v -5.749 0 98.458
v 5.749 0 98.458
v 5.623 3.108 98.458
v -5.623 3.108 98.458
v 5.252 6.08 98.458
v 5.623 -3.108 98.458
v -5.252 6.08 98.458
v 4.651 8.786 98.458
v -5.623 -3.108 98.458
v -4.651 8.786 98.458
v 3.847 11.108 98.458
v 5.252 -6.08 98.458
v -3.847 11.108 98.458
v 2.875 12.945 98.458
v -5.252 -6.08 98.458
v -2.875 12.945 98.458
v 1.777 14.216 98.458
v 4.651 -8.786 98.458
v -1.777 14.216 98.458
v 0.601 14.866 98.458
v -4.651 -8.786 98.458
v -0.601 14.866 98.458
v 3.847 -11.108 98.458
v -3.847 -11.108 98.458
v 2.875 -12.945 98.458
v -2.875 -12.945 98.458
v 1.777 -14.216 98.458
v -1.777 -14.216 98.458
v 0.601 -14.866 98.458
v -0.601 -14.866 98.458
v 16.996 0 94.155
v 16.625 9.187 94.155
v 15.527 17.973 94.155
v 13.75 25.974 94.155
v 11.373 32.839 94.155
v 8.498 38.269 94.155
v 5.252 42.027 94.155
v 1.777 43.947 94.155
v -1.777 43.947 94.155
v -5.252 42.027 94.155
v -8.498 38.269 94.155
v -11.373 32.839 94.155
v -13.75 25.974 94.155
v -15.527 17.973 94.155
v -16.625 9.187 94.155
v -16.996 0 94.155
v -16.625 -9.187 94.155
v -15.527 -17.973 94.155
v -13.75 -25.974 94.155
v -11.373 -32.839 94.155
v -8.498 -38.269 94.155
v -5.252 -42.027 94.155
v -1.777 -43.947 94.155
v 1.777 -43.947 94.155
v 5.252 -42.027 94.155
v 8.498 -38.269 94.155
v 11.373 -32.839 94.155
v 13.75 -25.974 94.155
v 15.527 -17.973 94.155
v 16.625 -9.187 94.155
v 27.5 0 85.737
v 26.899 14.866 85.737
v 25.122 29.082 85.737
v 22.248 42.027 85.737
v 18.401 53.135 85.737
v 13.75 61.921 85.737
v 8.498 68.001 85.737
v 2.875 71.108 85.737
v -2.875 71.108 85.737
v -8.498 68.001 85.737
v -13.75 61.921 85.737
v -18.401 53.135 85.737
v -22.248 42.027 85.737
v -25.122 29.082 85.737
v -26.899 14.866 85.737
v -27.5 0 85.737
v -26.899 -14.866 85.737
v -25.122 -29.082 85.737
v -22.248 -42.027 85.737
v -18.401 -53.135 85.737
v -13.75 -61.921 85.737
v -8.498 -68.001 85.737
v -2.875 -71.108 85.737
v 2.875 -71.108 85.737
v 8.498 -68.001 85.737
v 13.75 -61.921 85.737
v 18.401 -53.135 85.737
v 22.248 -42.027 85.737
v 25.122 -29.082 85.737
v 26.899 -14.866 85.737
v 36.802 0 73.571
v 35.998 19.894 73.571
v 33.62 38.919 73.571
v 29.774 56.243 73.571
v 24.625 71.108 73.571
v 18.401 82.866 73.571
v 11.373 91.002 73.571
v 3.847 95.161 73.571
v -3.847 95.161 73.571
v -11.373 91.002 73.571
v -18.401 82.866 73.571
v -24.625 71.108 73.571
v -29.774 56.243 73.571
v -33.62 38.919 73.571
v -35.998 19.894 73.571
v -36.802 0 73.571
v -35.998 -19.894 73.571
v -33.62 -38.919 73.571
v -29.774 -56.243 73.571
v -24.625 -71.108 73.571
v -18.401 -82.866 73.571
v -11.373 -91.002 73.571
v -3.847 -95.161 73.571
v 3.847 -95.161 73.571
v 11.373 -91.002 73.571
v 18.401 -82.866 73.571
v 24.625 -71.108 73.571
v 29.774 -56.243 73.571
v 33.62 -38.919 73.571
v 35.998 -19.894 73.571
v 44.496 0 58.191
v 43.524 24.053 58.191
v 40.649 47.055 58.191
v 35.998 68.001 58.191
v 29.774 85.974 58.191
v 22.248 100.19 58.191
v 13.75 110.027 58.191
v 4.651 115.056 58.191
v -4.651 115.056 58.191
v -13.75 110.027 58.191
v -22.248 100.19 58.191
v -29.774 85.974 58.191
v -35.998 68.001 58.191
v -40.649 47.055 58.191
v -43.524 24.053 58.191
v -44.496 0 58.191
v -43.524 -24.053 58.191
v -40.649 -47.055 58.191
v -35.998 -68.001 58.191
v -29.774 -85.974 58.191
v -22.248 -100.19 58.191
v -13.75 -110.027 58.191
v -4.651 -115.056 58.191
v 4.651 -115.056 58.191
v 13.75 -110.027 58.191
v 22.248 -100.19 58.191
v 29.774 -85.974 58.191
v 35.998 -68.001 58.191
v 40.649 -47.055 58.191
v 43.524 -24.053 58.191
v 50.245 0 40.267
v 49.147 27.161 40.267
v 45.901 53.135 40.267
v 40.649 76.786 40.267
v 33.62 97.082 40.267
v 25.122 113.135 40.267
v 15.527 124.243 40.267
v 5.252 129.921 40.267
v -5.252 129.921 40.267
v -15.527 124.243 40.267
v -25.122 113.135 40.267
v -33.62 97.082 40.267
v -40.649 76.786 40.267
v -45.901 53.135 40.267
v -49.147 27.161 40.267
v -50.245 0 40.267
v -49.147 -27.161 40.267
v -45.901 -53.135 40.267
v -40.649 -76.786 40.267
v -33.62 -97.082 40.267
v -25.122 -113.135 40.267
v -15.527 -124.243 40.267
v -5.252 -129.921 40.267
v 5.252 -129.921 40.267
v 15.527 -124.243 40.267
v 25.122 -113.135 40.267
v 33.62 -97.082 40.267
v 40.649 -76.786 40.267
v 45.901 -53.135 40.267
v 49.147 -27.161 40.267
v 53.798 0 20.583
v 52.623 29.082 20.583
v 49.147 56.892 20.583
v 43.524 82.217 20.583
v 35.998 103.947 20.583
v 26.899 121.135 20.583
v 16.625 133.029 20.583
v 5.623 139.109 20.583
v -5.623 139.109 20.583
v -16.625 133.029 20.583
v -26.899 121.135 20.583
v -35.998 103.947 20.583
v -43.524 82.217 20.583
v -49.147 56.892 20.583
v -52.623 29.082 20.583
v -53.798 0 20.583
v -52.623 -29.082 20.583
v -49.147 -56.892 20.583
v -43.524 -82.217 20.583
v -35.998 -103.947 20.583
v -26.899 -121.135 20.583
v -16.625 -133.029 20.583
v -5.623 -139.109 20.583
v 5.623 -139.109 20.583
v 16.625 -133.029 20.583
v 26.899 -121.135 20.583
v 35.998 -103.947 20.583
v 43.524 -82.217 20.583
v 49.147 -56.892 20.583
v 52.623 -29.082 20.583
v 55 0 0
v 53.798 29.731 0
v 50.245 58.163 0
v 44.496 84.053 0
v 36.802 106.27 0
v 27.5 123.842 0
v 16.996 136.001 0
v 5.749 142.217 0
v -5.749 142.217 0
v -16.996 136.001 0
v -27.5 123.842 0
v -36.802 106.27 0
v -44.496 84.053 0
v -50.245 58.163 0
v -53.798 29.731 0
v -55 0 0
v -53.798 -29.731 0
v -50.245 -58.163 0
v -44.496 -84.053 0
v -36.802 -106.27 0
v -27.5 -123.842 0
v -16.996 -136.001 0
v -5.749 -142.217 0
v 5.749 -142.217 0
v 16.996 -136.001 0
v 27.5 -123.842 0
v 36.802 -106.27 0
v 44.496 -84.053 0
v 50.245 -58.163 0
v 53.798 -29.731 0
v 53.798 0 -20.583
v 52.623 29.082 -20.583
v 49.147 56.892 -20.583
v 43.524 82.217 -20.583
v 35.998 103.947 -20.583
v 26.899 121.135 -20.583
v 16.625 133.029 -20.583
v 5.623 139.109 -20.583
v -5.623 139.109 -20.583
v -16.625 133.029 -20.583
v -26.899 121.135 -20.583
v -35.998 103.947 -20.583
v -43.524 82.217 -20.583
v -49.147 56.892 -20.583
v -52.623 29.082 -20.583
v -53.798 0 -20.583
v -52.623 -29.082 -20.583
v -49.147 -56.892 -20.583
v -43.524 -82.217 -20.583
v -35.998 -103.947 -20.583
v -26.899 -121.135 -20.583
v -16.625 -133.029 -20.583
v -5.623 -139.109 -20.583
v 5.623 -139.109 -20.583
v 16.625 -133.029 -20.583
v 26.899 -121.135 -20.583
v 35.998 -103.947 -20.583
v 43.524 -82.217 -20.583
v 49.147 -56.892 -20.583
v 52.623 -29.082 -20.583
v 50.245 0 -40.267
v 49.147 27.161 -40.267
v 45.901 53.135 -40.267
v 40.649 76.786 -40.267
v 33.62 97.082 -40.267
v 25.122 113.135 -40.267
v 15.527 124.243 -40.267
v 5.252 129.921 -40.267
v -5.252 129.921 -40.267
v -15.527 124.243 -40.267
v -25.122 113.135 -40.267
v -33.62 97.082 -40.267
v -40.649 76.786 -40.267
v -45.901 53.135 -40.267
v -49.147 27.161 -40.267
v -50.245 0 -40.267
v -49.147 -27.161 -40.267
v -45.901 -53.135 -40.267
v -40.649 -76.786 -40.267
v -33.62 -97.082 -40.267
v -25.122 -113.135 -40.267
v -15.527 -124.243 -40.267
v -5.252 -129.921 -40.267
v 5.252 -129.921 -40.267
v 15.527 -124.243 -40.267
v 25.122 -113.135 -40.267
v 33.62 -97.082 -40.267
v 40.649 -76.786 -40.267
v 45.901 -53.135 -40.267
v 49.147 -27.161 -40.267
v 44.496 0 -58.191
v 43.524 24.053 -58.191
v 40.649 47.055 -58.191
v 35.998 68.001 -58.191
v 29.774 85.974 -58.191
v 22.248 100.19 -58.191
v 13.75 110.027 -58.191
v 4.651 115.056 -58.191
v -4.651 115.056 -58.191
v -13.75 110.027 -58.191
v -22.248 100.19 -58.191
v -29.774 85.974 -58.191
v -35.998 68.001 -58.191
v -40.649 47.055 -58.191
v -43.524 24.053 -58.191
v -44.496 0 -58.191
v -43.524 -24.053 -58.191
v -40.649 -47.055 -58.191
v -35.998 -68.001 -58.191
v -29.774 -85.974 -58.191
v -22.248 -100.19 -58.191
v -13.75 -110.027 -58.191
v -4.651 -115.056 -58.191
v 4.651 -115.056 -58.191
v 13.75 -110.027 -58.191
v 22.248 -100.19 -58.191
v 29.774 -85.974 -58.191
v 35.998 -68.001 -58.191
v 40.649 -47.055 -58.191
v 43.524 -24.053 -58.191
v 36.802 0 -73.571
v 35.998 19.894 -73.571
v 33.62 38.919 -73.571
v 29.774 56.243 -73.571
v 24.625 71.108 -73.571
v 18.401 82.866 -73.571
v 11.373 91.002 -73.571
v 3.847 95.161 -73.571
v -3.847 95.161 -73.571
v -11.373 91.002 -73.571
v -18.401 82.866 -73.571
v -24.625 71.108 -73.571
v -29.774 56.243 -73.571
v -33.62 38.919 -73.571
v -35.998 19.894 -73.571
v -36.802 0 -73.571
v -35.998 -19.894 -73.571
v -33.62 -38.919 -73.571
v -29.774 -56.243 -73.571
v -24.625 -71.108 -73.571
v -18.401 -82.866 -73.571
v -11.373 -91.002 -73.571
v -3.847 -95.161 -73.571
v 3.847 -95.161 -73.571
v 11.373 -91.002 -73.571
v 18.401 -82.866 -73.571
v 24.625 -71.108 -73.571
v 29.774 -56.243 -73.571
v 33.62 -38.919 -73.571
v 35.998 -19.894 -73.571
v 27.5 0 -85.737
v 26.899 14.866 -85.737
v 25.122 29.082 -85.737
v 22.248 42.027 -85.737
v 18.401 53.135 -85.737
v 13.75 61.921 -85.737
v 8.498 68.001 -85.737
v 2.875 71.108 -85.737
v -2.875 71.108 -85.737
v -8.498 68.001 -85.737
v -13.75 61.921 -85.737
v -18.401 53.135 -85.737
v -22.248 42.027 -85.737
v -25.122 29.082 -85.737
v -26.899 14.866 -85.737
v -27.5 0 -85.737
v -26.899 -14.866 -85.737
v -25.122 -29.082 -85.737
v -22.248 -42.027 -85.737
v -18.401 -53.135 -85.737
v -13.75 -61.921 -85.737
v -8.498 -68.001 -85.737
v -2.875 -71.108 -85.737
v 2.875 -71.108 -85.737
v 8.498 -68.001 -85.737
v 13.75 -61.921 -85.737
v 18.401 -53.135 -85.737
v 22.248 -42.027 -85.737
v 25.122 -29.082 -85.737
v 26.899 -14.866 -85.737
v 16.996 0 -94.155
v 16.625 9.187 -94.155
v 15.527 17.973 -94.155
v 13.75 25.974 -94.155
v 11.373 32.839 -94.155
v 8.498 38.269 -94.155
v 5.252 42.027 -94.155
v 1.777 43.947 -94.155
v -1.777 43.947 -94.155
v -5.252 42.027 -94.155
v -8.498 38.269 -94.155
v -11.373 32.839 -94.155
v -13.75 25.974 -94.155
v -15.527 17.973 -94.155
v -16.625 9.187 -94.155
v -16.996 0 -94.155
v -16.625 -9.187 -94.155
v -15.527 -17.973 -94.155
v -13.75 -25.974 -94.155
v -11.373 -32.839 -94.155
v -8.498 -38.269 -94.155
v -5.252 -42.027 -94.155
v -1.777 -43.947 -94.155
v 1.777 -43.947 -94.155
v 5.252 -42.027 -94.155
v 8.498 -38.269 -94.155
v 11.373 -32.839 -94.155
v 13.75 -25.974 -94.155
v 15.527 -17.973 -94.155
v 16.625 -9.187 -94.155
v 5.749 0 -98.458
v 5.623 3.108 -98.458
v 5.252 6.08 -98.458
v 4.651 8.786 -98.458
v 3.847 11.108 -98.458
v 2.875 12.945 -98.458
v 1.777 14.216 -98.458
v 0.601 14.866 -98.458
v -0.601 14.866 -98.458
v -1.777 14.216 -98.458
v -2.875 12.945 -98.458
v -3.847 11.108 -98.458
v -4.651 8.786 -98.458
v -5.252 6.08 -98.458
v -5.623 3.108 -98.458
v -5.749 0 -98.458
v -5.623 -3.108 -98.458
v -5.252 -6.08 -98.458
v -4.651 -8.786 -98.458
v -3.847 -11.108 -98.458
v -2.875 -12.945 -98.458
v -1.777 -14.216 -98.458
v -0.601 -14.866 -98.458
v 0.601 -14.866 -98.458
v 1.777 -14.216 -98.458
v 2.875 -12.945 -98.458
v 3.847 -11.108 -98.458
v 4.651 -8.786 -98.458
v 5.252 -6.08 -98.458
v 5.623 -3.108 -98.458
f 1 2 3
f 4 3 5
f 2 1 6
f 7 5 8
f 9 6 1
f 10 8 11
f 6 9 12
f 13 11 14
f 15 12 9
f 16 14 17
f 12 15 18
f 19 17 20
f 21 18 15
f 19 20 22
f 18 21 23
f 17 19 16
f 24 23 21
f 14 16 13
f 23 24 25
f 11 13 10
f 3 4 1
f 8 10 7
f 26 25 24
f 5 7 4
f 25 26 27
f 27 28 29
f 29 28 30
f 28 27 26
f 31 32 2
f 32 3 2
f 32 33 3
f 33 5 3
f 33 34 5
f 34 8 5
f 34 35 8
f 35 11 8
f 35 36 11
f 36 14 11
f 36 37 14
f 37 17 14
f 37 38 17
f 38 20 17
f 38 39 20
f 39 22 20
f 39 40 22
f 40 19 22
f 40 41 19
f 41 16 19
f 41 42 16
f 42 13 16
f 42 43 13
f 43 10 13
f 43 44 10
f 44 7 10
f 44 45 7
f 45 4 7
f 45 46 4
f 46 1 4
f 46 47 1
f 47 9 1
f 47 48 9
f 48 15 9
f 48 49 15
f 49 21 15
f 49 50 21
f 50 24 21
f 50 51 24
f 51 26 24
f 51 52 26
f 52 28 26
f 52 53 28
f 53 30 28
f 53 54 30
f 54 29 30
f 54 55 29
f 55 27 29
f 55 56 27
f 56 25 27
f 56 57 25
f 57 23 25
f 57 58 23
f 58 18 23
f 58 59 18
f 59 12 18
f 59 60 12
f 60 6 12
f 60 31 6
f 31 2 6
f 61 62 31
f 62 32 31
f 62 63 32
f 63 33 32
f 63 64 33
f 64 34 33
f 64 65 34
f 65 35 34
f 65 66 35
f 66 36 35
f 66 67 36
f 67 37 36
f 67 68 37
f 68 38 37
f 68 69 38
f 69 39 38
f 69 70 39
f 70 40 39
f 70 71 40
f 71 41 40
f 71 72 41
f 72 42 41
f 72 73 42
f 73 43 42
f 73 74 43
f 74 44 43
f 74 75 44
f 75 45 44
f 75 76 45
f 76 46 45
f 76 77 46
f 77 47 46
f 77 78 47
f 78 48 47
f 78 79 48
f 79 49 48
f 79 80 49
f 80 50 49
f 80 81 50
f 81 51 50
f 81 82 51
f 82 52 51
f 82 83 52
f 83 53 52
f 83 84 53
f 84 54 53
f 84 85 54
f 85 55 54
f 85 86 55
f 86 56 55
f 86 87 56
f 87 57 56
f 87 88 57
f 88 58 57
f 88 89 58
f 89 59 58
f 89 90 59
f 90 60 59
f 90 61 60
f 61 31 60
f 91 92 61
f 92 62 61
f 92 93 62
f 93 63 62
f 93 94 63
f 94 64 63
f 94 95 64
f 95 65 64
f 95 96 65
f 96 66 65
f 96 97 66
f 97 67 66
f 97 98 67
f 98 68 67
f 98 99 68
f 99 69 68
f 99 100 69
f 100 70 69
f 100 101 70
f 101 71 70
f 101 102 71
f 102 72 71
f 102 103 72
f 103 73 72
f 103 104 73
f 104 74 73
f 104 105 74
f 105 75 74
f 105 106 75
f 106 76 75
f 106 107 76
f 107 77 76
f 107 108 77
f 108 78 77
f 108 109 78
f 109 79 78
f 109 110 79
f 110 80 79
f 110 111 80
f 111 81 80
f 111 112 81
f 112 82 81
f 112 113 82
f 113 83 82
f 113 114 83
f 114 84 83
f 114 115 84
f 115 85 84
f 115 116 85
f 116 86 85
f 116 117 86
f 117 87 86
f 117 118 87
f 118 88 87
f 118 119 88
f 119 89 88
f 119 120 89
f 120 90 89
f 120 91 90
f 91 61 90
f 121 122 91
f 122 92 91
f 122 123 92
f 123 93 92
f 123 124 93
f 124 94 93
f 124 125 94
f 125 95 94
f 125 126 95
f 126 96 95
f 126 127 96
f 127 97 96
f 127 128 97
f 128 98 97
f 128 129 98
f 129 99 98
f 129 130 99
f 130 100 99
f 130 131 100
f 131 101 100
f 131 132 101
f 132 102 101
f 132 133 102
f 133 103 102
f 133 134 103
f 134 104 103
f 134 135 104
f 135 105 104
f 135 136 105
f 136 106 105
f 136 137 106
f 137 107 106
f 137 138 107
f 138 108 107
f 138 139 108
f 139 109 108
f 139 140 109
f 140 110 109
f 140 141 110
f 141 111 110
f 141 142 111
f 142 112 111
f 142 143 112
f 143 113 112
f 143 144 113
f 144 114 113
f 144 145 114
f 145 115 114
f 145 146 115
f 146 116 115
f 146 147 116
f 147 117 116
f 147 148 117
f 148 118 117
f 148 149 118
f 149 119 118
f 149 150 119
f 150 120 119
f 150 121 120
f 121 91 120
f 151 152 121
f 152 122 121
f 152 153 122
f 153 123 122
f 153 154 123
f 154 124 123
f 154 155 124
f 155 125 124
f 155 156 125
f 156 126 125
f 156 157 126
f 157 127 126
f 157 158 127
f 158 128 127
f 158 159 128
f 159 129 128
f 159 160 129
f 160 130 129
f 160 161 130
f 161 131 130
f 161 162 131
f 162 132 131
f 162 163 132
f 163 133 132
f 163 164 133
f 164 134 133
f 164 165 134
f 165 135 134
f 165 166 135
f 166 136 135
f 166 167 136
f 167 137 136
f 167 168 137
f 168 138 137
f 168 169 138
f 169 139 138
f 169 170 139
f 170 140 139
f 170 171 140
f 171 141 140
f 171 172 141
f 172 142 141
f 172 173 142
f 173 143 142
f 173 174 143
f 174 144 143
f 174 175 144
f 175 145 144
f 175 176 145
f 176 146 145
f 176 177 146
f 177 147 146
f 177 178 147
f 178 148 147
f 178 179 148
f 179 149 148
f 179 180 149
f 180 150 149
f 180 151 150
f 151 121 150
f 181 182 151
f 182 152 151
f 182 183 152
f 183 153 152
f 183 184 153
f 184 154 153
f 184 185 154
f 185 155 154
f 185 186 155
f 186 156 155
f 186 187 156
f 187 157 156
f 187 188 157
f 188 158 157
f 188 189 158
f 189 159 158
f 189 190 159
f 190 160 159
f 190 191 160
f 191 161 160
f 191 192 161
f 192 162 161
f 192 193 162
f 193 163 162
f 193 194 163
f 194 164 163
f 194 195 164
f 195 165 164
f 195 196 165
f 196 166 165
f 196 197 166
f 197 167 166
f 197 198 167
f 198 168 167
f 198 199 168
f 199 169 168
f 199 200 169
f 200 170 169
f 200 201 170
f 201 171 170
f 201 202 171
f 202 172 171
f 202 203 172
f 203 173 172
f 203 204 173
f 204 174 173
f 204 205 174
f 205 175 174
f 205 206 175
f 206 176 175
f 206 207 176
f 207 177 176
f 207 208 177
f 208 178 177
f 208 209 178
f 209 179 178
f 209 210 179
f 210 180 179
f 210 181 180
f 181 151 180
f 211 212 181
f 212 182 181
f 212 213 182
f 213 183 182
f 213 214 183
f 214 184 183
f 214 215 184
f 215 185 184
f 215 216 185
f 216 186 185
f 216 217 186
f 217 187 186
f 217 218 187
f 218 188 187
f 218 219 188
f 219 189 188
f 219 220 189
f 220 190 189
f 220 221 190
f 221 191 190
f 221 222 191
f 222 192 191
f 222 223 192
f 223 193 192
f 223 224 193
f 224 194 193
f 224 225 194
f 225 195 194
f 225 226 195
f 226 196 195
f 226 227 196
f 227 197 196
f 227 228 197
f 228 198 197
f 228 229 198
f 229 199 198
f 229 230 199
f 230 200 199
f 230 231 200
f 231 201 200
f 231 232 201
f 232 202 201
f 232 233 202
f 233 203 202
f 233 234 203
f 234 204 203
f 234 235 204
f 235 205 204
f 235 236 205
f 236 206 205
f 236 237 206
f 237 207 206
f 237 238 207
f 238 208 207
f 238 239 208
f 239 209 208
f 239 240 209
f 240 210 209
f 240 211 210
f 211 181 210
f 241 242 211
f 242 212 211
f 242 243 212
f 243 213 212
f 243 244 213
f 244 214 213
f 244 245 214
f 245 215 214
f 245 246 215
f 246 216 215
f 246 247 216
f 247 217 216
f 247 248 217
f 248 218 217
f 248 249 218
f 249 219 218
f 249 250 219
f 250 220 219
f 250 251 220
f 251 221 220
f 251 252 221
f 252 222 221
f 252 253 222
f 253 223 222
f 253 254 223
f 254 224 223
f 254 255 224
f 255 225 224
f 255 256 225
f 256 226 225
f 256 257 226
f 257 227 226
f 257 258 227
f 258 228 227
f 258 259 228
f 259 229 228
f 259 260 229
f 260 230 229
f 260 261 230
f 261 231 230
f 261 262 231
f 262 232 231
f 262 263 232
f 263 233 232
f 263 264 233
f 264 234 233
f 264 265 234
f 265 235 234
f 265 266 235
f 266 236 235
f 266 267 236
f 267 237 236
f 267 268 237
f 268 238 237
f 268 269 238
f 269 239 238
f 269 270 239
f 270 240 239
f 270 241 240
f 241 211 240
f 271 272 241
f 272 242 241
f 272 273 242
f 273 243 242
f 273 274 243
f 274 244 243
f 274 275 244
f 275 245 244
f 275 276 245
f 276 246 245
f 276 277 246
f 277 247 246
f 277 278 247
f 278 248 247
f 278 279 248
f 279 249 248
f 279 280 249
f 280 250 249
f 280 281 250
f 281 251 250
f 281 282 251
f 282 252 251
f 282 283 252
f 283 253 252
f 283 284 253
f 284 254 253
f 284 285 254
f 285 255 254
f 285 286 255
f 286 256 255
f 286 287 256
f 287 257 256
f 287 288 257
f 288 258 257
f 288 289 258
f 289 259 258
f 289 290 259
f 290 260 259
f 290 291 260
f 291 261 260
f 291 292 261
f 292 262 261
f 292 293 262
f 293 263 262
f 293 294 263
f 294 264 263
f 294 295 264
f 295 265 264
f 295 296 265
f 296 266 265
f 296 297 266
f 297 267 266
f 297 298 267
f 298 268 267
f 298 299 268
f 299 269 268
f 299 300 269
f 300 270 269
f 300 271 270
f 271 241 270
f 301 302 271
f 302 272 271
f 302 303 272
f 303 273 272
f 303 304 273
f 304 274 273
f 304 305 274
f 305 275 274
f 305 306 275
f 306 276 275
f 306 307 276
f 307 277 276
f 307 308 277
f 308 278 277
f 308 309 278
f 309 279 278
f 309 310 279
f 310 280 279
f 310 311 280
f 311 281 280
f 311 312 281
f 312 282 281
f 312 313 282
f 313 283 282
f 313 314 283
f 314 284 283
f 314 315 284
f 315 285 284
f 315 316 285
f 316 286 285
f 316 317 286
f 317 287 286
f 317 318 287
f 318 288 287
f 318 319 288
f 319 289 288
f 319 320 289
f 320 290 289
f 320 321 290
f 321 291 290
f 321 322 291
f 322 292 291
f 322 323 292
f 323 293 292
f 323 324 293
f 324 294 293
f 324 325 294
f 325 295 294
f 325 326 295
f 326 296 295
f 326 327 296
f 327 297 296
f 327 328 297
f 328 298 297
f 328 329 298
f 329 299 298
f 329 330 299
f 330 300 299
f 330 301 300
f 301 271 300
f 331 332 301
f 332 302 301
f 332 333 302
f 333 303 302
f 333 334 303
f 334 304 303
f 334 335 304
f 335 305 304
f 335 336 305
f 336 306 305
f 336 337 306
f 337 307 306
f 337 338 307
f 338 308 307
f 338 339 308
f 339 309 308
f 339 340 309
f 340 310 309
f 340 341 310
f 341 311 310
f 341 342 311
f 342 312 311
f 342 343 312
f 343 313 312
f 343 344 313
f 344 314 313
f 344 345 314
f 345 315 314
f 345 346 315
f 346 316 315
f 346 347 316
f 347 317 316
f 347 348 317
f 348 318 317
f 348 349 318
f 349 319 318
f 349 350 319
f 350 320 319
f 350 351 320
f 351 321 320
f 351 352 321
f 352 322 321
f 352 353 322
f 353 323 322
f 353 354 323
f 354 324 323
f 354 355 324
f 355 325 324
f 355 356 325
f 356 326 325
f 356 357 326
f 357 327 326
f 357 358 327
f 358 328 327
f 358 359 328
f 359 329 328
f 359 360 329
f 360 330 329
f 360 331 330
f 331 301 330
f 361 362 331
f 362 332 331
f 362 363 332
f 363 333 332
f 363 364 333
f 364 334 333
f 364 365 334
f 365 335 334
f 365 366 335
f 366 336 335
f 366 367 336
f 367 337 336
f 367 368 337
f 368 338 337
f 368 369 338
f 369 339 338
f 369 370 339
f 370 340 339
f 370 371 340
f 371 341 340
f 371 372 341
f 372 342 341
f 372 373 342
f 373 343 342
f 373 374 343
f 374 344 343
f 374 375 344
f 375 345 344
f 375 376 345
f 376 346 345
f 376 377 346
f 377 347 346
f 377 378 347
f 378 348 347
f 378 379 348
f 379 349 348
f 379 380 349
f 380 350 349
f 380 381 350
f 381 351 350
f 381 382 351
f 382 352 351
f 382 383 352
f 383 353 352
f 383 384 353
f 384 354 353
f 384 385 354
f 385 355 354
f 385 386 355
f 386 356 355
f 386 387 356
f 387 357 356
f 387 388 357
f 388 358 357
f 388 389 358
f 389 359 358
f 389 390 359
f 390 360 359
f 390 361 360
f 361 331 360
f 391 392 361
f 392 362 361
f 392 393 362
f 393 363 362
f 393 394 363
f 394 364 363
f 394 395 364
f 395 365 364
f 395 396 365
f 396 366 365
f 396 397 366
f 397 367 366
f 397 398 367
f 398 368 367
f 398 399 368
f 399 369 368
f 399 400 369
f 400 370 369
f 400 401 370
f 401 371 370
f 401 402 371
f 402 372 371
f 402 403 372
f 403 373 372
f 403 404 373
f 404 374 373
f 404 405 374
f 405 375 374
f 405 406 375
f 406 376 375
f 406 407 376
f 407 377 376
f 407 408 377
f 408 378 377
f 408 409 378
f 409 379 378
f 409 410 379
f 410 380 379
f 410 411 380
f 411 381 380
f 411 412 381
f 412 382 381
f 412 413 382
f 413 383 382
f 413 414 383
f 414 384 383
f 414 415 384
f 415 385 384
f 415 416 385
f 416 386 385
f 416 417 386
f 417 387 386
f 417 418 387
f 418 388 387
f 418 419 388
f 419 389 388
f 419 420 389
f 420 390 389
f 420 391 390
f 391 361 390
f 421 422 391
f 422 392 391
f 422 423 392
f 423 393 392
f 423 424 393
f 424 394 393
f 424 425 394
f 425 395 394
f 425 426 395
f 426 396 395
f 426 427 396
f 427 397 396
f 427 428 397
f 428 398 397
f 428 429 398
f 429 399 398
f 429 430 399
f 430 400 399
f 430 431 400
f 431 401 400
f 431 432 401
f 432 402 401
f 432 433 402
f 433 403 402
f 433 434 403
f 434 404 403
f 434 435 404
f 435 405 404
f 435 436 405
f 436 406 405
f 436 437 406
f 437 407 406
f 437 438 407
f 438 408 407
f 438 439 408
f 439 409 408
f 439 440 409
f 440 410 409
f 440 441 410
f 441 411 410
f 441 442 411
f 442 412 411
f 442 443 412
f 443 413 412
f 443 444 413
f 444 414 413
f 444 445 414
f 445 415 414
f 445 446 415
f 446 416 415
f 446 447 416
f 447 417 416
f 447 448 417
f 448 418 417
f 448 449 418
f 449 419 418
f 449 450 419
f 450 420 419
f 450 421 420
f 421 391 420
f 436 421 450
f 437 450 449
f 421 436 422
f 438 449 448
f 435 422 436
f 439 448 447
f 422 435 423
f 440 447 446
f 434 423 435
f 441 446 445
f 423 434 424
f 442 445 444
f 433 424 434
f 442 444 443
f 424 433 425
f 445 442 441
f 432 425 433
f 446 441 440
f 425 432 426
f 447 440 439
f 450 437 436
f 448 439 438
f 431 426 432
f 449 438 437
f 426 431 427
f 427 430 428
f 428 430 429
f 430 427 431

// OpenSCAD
// Generated by SolidPython 1.0.1 on 2020-07-29 00:46:46


scale(v = [5, 13, 9]) {
	sphere(r = 11);
}
/***********************************************
*********      SolidPython code:      **********
************************************************
 
# import packages: SolidPython
from solid import *
from solid.utils import *
from itertools import chain, combinations, permutations


class Resize:

    def __init__(self, scad_file):
        self.scad_file = scad_file
        #self.scad_file = import_scad(scad_file)
        # cone/cylinder param:
        self.r1 = 0
        self.r2 = 0
        self.h = 0
        # rectangular prism param:
        self.w = 0
        self.l = 0
        # ellipse param:
        self.r = 0

    # import OpenScad code (file name corresponds to shape)


    # classify shape + parameters
    def assign(self, param1, param2, param3):
        if self.scad_file == 'cone.scad':
            self.r1 = param1
            self.r2 = param2
            self.h = param3
        elif self.scad_file == 'cylinder.scad':
            self.r1 = param1
            self.r2 = param2
            self.h = param3
        elif self.scad_file == 'rectangularPrism.scad':
            self.h = param1
            self.l = param2
            self.w = param3
        else:
            self.r = param1
            self.h = param2

    # resize parameters
    def iterate(self):
        x = range(3, 20, 2)
        i = 1
        if self.scad_file == 'cone.scad':
            tempList = list(permutations(x, 2))
            for temp in tempList:
                param1 = temp[0]
                param2 = temp[1]
                filepath = 'produced_scad_files/' + 'cone' + str(param1) + '_' + str(param2) + '_' + '.scad'
                scad_render_to_file(cylinder(h=param1, r1=param2, r2=0), filepath)

        elif self.scad_file == 'cylinder.scad':
            tempList = list(permutations(x, 3))
            for temp in tempList:
                param1 = temp[0]
                param2 = temp[1]
                filepath = 'produced_scad_files/' + 'cylinder' + str(param1) + '_' + str(param2) + '_' + '.scad'
                scad_render_to_file(cylinder(h=param1, r1=param2, r2=param2), filepath)

        elif self.scad_file == 'rectangularPrism.scad':
            tempList = list(permutations(x, 3))
            for temp in tempList:
                param1 = temp[0]
                param2 = temp[1]
                param3 = temp[2]
                filepath = 'produced_scad_files/' + 'rectangularPrism' + str(param1) + '_' + str(param2) + '_' + str(
                    param3) + '.scad'
                scad_render_to_file(cube(size=(param1, param2, param3)), filepath)

        elif self.scad_file == 'ellipse.scad':
            tempList = list(permutations(x, 4))
            for temp in tempList:
                param1 = temp[0]
                param2 = temp[1]
                param3 = temp[2]
                param4 = temp[3]
                filepath = 'produced_scad_files/' + 'ellipse' + str(param1) + '_' + str(param2) + '_' + str(param3) + '_' + str(param4) + '.scad'
                scad_render_to_file(scale([param1, param2, param3])(sphere(r=param4)), filepath)

    def render_to_scadfile(self):
        scad_render_to_file(scad, 'example.scad') 
 
************************************************/
